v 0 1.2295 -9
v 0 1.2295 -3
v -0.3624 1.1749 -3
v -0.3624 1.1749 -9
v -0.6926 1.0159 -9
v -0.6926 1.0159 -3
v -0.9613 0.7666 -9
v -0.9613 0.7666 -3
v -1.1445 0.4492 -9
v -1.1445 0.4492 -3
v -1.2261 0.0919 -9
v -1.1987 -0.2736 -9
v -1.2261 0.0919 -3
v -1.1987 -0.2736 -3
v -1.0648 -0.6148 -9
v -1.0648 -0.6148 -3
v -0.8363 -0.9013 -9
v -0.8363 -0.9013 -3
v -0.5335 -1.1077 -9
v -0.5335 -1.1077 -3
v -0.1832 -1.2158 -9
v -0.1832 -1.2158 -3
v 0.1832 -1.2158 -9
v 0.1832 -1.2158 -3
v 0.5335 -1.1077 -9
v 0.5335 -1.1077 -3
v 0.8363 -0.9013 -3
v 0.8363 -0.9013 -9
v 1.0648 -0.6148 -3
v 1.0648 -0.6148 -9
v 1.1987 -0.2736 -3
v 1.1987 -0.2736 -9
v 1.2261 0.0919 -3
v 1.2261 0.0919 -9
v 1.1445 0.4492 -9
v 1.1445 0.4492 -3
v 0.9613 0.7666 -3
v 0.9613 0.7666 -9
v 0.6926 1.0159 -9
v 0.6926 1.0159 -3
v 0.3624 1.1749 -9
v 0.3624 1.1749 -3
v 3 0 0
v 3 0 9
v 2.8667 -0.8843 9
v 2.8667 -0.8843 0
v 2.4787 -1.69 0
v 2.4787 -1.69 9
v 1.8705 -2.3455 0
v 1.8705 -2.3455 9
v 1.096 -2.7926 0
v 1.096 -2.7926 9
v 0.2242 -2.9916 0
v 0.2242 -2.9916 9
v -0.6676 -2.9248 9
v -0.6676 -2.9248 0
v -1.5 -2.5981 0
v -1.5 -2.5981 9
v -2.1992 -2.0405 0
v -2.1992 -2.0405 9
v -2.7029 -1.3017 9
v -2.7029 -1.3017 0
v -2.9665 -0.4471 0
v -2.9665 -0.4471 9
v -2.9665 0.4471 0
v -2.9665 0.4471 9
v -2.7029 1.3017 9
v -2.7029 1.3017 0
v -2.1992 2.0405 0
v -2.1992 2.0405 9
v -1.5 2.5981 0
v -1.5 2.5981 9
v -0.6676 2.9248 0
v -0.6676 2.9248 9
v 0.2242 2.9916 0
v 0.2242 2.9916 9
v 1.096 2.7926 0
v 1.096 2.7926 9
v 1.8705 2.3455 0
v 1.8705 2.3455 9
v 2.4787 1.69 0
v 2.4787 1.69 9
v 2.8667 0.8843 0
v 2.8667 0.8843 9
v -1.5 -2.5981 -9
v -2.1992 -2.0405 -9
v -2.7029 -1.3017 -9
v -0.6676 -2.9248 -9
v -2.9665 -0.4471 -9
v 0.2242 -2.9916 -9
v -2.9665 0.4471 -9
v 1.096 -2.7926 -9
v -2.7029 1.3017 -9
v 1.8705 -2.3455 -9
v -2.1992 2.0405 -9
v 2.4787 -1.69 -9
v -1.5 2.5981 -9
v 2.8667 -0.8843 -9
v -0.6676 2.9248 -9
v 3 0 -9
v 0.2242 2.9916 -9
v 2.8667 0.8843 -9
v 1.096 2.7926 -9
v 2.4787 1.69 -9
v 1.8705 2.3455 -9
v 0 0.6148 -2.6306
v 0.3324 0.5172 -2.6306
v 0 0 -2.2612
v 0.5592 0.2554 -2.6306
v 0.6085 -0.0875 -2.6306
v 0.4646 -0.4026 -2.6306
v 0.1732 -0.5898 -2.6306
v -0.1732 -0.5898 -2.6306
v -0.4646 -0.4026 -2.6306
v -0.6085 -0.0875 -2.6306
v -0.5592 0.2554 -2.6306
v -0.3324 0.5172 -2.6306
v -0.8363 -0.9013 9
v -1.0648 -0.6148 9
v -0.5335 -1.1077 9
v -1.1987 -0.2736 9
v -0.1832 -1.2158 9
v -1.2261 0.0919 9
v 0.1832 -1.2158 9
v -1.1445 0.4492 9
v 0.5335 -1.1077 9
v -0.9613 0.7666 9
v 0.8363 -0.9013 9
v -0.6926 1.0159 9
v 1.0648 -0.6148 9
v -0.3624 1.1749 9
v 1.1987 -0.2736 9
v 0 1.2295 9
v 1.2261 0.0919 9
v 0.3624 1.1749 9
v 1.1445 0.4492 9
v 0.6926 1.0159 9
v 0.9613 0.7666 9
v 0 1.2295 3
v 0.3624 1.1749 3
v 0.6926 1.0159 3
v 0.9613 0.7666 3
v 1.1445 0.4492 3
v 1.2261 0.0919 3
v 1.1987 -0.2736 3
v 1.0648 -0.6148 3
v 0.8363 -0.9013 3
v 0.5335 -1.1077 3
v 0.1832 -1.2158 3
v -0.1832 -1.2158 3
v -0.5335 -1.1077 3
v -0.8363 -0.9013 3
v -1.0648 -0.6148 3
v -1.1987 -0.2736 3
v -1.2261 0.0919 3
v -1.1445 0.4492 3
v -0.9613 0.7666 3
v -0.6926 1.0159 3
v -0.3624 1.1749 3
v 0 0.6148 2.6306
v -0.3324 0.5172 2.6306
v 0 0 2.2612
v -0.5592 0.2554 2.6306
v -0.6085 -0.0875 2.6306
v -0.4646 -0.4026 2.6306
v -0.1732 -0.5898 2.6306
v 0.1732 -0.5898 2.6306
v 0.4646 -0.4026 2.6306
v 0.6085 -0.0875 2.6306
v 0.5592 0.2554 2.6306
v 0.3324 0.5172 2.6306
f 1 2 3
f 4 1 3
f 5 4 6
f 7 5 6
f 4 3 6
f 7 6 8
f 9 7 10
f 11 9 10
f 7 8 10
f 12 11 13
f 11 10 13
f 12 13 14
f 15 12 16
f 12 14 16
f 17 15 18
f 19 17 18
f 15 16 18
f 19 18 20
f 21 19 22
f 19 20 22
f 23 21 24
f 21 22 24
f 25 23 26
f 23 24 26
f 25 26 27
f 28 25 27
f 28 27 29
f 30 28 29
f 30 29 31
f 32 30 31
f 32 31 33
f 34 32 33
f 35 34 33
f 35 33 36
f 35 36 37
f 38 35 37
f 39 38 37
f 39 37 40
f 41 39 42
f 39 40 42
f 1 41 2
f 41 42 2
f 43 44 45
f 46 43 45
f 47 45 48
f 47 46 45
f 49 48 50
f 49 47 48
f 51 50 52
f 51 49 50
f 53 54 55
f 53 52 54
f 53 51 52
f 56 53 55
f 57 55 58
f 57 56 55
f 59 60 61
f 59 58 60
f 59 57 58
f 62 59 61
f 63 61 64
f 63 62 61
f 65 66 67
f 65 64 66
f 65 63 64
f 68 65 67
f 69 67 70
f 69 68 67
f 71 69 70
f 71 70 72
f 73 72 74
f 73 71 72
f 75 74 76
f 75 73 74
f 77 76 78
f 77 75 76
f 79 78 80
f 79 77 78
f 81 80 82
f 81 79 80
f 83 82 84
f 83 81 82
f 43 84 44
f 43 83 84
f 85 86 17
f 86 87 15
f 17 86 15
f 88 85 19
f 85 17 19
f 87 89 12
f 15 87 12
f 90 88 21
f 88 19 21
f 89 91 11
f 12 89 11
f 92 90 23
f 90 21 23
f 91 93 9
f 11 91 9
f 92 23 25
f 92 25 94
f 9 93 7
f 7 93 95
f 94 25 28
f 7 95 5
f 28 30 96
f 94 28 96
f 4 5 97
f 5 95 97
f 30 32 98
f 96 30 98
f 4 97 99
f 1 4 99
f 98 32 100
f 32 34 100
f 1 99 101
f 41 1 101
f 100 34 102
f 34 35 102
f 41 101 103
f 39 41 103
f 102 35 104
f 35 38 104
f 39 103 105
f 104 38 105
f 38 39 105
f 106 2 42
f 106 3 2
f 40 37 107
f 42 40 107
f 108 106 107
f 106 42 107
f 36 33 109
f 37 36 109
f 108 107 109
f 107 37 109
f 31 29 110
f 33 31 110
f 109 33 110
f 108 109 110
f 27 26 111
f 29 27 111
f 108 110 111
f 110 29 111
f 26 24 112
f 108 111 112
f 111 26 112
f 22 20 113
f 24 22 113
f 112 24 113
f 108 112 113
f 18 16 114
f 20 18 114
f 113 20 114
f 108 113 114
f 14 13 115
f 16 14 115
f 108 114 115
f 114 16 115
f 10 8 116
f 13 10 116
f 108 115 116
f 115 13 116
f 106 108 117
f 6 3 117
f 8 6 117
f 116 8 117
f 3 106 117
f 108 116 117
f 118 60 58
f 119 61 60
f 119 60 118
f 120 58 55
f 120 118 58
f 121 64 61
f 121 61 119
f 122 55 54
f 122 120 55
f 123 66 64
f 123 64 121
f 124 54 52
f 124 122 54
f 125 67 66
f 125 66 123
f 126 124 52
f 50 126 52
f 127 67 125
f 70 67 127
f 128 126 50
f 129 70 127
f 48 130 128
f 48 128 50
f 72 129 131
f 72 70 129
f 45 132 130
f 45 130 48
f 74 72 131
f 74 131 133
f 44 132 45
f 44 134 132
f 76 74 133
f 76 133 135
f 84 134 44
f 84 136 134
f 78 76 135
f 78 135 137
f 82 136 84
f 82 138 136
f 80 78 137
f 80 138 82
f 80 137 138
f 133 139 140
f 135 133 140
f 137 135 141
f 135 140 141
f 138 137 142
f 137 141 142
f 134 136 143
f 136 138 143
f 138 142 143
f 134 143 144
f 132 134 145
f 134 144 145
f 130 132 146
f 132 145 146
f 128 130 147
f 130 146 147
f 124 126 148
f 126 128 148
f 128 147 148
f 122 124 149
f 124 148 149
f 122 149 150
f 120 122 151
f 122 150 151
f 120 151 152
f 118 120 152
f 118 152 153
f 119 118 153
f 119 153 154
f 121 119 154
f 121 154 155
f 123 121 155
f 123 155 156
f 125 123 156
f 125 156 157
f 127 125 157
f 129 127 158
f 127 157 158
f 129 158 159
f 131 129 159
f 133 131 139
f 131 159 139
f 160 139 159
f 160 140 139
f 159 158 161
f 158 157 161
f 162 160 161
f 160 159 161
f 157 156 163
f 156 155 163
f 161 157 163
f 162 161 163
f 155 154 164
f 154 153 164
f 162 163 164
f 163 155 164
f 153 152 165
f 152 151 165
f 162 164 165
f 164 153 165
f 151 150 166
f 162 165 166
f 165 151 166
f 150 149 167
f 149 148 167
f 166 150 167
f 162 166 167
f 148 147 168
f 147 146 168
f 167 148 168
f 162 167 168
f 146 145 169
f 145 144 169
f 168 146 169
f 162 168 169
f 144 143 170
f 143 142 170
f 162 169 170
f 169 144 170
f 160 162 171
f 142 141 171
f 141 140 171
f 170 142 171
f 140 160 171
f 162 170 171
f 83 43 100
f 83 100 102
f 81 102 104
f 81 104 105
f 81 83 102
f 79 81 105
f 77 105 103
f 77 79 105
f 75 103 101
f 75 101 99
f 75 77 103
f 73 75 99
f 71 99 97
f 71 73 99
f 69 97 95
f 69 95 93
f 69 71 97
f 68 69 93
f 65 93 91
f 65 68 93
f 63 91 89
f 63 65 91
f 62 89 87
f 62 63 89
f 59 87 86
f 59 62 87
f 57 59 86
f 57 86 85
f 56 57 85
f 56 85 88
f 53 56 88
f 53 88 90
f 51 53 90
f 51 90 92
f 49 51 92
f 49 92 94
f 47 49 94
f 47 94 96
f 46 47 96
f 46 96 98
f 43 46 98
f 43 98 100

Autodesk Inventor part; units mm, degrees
ref_plane "YZ Plane" through (0, 0, 0) normal (1, 0, 0) x (0, 1, 0)
ref_plane "XZ Plane" through (0, 0, 0) normal (0, 1, 0) x (-1, 0, 0)
ref_plane "XY Plane" through (0, 0, 0) normal (0, 0, 1) x (1, 0, 0)
sketch "Skizze1" plane through (0, 0, 0) normal (0, 0, 1) x (1, 0, 0)
  circle A0 centre (0, 0) radius 3
  dimension "d0" = 6
extrude "Extrusion1" add sketch "Skizze1" along normal mid plane 18
sketch "Skizze3" plane through (0, 0, -9) normal (0, 0, -1) x (-1, 0, 0)
  point P0 (0, 0)
  point P1 (0, 0)
hole "Bohrung2" at (0, 0, -9) direction (0, 0, 1) diameter 2.459 depth 6 tip angle 118 thread size "M3x0.5" class "6H" standard "ISO Metric profile"
mirror "Spiegeln1" about plane through (0, 0, 0) normal (0, 0, 1) of "Bohrung2"
properties part number "Abstandsbolzen_Kamera"
